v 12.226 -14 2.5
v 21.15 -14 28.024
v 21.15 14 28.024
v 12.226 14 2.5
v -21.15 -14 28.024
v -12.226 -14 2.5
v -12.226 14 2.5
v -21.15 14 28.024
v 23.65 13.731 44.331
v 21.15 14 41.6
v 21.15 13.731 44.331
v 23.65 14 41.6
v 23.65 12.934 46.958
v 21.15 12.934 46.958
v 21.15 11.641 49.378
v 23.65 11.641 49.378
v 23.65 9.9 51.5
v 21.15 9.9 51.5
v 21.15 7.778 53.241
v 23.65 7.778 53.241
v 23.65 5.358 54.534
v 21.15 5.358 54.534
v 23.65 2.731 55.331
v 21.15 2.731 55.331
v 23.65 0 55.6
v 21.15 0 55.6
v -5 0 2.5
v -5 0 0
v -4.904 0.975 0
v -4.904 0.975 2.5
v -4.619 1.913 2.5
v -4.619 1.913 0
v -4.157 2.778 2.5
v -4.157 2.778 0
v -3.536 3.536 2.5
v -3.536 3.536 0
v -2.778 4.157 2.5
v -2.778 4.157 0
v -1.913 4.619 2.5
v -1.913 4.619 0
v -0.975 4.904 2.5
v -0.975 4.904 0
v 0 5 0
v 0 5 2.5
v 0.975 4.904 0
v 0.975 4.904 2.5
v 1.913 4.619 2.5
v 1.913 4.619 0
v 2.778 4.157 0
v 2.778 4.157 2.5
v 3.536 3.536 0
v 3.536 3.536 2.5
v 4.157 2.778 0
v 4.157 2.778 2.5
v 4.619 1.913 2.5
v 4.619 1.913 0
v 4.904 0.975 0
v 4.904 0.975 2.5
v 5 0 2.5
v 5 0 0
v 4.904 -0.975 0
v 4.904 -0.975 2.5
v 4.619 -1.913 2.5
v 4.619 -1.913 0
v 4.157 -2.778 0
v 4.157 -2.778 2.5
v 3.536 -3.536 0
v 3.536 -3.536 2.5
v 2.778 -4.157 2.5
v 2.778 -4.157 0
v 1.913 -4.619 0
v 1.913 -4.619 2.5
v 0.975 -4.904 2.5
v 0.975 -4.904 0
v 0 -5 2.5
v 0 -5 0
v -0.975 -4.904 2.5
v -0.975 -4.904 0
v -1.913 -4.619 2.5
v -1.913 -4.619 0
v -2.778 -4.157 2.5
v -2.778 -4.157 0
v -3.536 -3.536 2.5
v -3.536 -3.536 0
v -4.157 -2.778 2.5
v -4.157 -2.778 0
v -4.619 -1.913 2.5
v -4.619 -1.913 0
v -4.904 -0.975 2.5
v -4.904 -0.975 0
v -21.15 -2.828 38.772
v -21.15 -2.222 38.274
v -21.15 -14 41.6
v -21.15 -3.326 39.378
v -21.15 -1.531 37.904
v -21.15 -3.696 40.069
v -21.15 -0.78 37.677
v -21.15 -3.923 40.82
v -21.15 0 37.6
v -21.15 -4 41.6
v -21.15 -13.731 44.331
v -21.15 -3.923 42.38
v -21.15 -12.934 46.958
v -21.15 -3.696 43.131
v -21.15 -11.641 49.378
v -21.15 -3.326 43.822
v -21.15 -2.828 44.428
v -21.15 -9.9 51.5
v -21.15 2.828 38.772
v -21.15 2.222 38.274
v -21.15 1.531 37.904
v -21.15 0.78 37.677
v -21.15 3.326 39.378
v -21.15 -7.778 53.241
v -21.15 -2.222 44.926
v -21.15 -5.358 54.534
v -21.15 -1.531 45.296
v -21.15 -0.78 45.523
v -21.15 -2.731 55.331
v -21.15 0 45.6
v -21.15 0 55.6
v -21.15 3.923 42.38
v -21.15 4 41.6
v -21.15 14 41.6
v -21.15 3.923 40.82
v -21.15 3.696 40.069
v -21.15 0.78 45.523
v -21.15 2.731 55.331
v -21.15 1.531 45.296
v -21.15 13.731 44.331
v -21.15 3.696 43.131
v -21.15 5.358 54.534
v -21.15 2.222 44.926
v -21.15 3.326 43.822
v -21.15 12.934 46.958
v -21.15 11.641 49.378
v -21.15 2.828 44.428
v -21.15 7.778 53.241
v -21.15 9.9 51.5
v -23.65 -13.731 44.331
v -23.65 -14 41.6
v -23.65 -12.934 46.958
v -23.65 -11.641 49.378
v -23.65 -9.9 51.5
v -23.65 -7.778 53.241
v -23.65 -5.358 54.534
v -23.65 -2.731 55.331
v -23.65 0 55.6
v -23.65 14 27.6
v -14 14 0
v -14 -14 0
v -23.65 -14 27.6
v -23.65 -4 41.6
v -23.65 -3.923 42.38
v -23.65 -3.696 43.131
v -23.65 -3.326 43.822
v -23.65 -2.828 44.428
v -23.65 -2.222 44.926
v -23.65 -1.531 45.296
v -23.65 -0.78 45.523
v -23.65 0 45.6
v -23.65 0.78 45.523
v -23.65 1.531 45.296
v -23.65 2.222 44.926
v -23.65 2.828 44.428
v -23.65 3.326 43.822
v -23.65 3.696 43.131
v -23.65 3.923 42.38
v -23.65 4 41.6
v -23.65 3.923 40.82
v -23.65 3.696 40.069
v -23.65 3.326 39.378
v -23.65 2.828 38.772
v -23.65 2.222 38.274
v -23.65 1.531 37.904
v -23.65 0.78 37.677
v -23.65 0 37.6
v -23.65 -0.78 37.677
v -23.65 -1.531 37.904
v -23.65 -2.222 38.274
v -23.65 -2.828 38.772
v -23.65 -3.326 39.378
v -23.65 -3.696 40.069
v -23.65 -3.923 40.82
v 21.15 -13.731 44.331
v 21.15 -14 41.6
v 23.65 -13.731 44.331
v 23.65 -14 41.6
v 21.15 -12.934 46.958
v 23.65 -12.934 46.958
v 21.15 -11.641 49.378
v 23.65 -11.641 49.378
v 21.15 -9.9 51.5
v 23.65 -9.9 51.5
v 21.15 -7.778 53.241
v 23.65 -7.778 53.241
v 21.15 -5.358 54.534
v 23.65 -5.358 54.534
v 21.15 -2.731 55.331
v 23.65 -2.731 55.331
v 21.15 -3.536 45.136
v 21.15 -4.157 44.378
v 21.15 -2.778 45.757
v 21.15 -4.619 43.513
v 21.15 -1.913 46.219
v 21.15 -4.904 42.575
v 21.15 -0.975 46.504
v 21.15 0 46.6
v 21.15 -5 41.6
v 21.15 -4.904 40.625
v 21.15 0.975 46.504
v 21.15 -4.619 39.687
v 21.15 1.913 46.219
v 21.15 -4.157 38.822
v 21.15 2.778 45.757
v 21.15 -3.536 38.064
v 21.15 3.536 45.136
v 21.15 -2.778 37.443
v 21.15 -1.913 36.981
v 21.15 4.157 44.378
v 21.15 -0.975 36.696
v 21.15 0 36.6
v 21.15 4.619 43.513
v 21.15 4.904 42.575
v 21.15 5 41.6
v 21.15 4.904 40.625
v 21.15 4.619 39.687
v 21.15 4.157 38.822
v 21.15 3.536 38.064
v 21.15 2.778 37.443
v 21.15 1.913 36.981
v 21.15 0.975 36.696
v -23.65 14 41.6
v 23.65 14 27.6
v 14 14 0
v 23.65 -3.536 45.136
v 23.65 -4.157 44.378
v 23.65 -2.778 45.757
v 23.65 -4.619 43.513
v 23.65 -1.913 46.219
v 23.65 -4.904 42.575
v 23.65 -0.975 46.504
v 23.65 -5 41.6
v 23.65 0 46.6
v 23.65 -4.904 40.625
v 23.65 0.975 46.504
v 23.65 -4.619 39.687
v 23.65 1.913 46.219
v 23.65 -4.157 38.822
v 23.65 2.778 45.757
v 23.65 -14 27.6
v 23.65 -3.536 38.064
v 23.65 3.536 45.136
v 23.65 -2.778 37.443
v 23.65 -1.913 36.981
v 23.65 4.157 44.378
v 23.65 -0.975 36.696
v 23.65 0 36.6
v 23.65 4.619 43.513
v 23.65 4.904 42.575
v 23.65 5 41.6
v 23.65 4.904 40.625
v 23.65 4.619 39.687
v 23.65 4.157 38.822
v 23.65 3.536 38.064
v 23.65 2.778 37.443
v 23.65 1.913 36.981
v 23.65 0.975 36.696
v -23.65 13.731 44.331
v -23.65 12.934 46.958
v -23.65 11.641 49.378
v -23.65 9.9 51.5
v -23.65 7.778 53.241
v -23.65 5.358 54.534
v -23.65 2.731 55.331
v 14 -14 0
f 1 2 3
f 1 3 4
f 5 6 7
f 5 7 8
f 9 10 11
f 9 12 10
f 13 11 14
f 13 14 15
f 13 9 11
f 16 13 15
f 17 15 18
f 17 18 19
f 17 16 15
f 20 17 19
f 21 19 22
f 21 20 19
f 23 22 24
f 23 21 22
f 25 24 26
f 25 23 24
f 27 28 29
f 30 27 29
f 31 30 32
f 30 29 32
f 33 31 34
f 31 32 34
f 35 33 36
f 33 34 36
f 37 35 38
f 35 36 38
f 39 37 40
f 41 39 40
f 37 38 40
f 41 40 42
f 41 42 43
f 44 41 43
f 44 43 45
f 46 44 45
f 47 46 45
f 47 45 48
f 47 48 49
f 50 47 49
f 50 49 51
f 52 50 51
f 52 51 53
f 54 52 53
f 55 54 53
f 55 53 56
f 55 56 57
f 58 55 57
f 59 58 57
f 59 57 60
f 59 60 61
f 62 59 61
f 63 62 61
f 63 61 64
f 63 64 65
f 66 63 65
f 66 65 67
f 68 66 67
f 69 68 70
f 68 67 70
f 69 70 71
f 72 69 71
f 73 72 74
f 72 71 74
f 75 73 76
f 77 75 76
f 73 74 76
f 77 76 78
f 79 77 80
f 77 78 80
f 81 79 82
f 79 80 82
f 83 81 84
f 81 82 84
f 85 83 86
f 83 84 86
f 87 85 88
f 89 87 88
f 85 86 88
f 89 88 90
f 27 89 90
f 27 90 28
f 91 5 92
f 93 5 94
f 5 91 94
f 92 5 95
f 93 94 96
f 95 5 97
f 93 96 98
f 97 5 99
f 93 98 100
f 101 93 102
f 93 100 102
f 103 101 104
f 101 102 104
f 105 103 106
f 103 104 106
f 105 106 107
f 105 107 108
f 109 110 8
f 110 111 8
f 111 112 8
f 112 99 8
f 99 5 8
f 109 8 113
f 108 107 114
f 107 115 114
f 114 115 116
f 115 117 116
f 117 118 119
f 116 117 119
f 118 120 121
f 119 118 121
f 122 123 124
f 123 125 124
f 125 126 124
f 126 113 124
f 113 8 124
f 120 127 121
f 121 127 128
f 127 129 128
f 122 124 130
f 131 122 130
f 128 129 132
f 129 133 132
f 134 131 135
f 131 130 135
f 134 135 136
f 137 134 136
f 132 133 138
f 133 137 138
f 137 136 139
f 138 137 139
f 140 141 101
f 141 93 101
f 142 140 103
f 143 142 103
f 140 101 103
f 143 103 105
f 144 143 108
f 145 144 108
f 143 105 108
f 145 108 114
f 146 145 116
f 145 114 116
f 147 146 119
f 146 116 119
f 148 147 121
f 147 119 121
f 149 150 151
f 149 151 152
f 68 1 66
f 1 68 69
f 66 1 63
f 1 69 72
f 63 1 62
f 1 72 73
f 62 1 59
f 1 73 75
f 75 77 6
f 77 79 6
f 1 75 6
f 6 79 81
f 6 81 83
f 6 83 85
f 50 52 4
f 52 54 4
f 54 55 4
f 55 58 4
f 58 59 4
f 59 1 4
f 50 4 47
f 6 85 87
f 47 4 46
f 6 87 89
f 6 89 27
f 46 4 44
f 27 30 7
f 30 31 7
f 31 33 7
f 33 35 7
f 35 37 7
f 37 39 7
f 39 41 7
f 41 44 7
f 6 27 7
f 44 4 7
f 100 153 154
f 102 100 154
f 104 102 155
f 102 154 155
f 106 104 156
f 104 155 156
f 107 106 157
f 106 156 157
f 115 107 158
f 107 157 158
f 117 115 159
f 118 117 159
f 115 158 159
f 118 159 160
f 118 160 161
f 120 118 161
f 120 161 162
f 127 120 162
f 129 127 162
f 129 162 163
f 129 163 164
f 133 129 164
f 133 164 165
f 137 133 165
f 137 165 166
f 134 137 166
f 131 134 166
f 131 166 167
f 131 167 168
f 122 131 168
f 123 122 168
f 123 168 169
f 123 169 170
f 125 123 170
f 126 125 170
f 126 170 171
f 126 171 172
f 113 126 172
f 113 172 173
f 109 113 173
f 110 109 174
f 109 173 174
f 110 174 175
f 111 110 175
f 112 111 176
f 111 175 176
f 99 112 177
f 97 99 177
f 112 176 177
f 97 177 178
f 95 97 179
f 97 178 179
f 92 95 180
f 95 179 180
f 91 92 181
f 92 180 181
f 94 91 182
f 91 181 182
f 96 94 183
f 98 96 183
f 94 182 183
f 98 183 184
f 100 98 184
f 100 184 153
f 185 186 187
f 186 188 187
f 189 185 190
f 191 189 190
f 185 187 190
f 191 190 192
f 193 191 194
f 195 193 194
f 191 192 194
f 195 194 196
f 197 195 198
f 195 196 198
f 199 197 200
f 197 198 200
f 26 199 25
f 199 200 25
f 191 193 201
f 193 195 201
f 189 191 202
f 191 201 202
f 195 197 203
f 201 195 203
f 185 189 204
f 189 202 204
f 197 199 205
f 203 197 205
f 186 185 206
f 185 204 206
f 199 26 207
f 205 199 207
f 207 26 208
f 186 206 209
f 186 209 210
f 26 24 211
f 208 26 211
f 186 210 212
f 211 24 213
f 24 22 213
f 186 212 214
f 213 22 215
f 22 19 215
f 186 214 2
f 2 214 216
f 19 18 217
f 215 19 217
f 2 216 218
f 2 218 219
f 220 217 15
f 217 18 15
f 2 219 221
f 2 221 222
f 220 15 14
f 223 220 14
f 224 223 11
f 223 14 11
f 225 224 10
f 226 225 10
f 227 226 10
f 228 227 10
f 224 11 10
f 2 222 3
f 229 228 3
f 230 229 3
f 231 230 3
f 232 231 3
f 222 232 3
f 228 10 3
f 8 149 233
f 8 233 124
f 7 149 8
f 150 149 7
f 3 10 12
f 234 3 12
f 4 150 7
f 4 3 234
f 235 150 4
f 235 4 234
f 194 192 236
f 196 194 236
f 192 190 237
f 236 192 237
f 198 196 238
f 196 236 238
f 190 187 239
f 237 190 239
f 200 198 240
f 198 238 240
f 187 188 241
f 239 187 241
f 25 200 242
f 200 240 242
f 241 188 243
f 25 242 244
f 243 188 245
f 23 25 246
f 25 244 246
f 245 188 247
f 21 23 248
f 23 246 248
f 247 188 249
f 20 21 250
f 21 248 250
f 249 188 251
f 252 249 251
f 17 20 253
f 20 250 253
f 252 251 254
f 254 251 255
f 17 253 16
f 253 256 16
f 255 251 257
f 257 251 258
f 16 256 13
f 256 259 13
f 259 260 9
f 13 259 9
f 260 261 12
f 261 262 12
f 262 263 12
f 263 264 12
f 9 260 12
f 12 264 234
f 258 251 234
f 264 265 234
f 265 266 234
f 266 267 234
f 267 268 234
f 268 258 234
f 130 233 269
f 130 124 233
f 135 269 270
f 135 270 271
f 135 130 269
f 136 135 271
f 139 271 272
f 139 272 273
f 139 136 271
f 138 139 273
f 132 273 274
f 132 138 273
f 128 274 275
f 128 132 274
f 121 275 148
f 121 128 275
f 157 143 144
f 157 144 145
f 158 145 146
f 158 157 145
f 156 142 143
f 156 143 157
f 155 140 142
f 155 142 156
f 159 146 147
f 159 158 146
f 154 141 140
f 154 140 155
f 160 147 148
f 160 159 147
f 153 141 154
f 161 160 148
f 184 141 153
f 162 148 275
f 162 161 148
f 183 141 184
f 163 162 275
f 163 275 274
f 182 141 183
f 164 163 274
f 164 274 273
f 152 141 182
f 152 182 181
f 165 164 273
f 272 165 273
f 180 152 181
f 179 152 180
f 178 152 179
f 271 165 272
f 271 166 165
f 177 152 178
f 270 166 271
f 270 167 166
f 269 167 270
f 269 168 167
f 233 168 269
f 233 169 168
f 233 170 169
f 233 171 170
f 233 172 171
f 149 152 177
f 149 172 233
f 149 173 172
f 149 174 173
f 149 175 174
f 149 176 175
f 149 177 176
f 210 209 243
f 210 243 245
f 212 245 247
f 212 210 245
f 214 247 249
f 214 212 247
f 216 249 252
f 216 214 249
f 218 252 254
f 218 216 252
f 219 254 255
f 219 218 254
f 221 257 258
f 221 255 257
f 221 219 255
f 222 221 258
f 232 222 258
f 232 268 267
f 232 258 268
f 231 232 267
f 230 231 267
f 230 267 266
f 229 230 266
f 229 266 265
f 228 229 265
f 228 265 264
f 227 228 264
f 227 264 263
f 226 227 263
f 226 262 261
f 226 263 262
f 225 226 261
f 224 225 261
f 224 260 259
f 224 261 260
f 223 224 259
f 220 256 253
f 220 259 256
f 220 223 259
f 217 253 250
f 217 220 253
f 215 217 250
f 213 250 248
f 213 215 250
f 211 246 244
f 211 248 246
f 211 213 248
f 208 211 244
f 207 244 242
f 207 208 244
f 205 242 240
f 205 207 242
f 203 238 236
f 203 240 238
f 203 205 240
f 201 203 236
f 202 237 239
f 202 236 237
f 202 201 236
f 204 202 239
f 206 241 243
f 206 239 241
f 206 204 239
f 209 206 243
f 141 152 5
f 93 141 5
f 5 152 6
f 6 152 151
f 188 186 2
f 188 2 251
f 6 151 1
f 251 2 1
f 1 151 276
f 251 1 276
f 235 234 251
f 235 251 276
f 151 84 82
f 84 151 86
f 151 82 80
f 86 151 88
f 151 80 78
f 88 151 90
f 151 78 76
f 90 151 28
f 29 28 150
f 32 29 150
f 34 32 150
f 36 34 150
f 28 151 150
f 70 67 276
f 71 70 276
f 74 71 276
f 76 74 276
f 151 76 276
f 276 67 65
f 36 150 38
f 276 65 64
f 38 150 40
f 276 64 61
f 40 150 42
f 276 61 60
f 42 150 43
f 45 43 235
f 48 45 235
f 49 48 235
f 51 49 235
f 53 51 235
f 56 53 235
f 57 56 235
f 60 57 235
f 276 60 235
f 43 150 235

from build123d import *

# Parameters (mm, degrees)
ESBO_O1_W                  = 47.3
ESBO_O1_H                  = 28
RESSALTO_EXTRUS_O1_DEPTH   = 55.6
CORTE_EXTRUS_O1_DEPTH      = 67.593411836
CORTE_EXTRUS_O2_DEPTH      = 67.593411836
CORTE_EXTRUS_O3_DEPTH      = 75.327989345
CORTE_EXTRUS_O3_DEPTH_BACK = 5.6
ESBO_O4_R                  = 5
ESBO_O5_R                  = 4
CORTE_EXTRUS_O6_DEPTH      = 5.6
FILETE1_R                  = 14
FILETE2_R                  = 14
ESBO_O6_R                  = 5
CORTE_EXTRUS_O7_DEPTH      = 5.6


with BuildPart() as part:
    # Esboço1 → Ressalto-extrusão1 (new body)
    with BuildSketch(Plane.XY):
        Rectangle(ESBO_O1_W, ESBO_O1_H)
    extrude(amount=RESSALTO_EXTRUS_O1_DEPTH)

    # Esboço2 → Corte-extrusão1 (cut, through all)
    with BuildSketch(Plane(origin=(0, 14, 0), x_dir=(1, 0, 0), z_dir=(0, 1, 0))):
        Polygon((-23.65, -27.6), (-23.65, 0), (-14, 0), align=None)
        Polygon((14, 0), (23.65, 0), (23.65, -27.6), align=None)
    extrude(amount=-CORTE_EXTRUS_O1_DEPTH, mode=Mode.SUBTRACT)

    # Esboço3 → Corte-extrusão2 (cut, through all)
    with BuildSketch(Plane(origin=(0, 14, 0), x_dir=(1, 0, 0), z_dir=(0, 1, 0))):
        Polygon((-21.15, -28.02444916), (-21.15, -55.6), (21.15, -55.6), (21.15, -28.02444916), (12.225690783, -2.5), (-12.225690783, -2.5), align=None)
    extrude(amount=-CORTE_EXTRUS_O2_DEPTH, mode=Mode.SUBTRACT)

    # Esboço4 → Corte-extrusão3 (cut, two sides: drawn at the far end of the back side and taken through both)
    with BuildSketch(Plane(origin=(23.65, 0, 0), x_dir=(0, 0, -1), z_dir=(1, 0, 0)).offset(-CORTE_EXTRUS_O3_DEPTH_BACK)):
        with Locations(Location((-41.6, 0, 0), (0, 0, 270))):
            Circle(ESBO_O4_R)
    extrude(amount=CORTE_EXTRUS_O3_DEPTH + CORTE_EXTRUS_O3_DEPTH_BACK, mode=Mode.SUBTRACT)

    # Esboço5 → Corte-extrusão6 (cut)
    with BuildSketch(Plane.ZY.offset(23.65)):
        with Locations(Location((41.6, 0, 0), (0, 0, 270))):
            Circle(ESBO_O5_R)
    extrude(amount=-CORTE_EXTRUS_O6_DEPTH, mode=Mode.SUBTRACT)

    # Filete1
    filete1_edges = [part.edges().sort_by_distance(p)[0] for p in [
        (-22.4, -14, 55.6),
        (-22.4, 14, 55.6),
    ]]
    fillet(filete1_edges, radius=FILETE1_R - 0.0001)  # a hair under: the kernel refuses the full size

    # Filete2
    filete2_edges = [part.edges().sort_by_distance(p)[0] for p in [
        (22.4, -14, 55.6),
        (22.4, 14, 55.6),
    ]]
    fillet(filete2_edges, radius=FILETE2_R - 0.0001)  # a hair under: the kernel refuses the full size

    # Esboço6 → Corte-extrusão7 (cut)
    with BuildSketch(Plane(origin=(0, 0, 0), x_dir=(-1, 0, 0), z_dir=(0, 0, -1))):
        Circle(ESBO_O6_R)
    extrude(amount=-CORTE_EXTRUS_O7_DEPTH, mode=Mode.SUBTRACT)


solid = part.part
